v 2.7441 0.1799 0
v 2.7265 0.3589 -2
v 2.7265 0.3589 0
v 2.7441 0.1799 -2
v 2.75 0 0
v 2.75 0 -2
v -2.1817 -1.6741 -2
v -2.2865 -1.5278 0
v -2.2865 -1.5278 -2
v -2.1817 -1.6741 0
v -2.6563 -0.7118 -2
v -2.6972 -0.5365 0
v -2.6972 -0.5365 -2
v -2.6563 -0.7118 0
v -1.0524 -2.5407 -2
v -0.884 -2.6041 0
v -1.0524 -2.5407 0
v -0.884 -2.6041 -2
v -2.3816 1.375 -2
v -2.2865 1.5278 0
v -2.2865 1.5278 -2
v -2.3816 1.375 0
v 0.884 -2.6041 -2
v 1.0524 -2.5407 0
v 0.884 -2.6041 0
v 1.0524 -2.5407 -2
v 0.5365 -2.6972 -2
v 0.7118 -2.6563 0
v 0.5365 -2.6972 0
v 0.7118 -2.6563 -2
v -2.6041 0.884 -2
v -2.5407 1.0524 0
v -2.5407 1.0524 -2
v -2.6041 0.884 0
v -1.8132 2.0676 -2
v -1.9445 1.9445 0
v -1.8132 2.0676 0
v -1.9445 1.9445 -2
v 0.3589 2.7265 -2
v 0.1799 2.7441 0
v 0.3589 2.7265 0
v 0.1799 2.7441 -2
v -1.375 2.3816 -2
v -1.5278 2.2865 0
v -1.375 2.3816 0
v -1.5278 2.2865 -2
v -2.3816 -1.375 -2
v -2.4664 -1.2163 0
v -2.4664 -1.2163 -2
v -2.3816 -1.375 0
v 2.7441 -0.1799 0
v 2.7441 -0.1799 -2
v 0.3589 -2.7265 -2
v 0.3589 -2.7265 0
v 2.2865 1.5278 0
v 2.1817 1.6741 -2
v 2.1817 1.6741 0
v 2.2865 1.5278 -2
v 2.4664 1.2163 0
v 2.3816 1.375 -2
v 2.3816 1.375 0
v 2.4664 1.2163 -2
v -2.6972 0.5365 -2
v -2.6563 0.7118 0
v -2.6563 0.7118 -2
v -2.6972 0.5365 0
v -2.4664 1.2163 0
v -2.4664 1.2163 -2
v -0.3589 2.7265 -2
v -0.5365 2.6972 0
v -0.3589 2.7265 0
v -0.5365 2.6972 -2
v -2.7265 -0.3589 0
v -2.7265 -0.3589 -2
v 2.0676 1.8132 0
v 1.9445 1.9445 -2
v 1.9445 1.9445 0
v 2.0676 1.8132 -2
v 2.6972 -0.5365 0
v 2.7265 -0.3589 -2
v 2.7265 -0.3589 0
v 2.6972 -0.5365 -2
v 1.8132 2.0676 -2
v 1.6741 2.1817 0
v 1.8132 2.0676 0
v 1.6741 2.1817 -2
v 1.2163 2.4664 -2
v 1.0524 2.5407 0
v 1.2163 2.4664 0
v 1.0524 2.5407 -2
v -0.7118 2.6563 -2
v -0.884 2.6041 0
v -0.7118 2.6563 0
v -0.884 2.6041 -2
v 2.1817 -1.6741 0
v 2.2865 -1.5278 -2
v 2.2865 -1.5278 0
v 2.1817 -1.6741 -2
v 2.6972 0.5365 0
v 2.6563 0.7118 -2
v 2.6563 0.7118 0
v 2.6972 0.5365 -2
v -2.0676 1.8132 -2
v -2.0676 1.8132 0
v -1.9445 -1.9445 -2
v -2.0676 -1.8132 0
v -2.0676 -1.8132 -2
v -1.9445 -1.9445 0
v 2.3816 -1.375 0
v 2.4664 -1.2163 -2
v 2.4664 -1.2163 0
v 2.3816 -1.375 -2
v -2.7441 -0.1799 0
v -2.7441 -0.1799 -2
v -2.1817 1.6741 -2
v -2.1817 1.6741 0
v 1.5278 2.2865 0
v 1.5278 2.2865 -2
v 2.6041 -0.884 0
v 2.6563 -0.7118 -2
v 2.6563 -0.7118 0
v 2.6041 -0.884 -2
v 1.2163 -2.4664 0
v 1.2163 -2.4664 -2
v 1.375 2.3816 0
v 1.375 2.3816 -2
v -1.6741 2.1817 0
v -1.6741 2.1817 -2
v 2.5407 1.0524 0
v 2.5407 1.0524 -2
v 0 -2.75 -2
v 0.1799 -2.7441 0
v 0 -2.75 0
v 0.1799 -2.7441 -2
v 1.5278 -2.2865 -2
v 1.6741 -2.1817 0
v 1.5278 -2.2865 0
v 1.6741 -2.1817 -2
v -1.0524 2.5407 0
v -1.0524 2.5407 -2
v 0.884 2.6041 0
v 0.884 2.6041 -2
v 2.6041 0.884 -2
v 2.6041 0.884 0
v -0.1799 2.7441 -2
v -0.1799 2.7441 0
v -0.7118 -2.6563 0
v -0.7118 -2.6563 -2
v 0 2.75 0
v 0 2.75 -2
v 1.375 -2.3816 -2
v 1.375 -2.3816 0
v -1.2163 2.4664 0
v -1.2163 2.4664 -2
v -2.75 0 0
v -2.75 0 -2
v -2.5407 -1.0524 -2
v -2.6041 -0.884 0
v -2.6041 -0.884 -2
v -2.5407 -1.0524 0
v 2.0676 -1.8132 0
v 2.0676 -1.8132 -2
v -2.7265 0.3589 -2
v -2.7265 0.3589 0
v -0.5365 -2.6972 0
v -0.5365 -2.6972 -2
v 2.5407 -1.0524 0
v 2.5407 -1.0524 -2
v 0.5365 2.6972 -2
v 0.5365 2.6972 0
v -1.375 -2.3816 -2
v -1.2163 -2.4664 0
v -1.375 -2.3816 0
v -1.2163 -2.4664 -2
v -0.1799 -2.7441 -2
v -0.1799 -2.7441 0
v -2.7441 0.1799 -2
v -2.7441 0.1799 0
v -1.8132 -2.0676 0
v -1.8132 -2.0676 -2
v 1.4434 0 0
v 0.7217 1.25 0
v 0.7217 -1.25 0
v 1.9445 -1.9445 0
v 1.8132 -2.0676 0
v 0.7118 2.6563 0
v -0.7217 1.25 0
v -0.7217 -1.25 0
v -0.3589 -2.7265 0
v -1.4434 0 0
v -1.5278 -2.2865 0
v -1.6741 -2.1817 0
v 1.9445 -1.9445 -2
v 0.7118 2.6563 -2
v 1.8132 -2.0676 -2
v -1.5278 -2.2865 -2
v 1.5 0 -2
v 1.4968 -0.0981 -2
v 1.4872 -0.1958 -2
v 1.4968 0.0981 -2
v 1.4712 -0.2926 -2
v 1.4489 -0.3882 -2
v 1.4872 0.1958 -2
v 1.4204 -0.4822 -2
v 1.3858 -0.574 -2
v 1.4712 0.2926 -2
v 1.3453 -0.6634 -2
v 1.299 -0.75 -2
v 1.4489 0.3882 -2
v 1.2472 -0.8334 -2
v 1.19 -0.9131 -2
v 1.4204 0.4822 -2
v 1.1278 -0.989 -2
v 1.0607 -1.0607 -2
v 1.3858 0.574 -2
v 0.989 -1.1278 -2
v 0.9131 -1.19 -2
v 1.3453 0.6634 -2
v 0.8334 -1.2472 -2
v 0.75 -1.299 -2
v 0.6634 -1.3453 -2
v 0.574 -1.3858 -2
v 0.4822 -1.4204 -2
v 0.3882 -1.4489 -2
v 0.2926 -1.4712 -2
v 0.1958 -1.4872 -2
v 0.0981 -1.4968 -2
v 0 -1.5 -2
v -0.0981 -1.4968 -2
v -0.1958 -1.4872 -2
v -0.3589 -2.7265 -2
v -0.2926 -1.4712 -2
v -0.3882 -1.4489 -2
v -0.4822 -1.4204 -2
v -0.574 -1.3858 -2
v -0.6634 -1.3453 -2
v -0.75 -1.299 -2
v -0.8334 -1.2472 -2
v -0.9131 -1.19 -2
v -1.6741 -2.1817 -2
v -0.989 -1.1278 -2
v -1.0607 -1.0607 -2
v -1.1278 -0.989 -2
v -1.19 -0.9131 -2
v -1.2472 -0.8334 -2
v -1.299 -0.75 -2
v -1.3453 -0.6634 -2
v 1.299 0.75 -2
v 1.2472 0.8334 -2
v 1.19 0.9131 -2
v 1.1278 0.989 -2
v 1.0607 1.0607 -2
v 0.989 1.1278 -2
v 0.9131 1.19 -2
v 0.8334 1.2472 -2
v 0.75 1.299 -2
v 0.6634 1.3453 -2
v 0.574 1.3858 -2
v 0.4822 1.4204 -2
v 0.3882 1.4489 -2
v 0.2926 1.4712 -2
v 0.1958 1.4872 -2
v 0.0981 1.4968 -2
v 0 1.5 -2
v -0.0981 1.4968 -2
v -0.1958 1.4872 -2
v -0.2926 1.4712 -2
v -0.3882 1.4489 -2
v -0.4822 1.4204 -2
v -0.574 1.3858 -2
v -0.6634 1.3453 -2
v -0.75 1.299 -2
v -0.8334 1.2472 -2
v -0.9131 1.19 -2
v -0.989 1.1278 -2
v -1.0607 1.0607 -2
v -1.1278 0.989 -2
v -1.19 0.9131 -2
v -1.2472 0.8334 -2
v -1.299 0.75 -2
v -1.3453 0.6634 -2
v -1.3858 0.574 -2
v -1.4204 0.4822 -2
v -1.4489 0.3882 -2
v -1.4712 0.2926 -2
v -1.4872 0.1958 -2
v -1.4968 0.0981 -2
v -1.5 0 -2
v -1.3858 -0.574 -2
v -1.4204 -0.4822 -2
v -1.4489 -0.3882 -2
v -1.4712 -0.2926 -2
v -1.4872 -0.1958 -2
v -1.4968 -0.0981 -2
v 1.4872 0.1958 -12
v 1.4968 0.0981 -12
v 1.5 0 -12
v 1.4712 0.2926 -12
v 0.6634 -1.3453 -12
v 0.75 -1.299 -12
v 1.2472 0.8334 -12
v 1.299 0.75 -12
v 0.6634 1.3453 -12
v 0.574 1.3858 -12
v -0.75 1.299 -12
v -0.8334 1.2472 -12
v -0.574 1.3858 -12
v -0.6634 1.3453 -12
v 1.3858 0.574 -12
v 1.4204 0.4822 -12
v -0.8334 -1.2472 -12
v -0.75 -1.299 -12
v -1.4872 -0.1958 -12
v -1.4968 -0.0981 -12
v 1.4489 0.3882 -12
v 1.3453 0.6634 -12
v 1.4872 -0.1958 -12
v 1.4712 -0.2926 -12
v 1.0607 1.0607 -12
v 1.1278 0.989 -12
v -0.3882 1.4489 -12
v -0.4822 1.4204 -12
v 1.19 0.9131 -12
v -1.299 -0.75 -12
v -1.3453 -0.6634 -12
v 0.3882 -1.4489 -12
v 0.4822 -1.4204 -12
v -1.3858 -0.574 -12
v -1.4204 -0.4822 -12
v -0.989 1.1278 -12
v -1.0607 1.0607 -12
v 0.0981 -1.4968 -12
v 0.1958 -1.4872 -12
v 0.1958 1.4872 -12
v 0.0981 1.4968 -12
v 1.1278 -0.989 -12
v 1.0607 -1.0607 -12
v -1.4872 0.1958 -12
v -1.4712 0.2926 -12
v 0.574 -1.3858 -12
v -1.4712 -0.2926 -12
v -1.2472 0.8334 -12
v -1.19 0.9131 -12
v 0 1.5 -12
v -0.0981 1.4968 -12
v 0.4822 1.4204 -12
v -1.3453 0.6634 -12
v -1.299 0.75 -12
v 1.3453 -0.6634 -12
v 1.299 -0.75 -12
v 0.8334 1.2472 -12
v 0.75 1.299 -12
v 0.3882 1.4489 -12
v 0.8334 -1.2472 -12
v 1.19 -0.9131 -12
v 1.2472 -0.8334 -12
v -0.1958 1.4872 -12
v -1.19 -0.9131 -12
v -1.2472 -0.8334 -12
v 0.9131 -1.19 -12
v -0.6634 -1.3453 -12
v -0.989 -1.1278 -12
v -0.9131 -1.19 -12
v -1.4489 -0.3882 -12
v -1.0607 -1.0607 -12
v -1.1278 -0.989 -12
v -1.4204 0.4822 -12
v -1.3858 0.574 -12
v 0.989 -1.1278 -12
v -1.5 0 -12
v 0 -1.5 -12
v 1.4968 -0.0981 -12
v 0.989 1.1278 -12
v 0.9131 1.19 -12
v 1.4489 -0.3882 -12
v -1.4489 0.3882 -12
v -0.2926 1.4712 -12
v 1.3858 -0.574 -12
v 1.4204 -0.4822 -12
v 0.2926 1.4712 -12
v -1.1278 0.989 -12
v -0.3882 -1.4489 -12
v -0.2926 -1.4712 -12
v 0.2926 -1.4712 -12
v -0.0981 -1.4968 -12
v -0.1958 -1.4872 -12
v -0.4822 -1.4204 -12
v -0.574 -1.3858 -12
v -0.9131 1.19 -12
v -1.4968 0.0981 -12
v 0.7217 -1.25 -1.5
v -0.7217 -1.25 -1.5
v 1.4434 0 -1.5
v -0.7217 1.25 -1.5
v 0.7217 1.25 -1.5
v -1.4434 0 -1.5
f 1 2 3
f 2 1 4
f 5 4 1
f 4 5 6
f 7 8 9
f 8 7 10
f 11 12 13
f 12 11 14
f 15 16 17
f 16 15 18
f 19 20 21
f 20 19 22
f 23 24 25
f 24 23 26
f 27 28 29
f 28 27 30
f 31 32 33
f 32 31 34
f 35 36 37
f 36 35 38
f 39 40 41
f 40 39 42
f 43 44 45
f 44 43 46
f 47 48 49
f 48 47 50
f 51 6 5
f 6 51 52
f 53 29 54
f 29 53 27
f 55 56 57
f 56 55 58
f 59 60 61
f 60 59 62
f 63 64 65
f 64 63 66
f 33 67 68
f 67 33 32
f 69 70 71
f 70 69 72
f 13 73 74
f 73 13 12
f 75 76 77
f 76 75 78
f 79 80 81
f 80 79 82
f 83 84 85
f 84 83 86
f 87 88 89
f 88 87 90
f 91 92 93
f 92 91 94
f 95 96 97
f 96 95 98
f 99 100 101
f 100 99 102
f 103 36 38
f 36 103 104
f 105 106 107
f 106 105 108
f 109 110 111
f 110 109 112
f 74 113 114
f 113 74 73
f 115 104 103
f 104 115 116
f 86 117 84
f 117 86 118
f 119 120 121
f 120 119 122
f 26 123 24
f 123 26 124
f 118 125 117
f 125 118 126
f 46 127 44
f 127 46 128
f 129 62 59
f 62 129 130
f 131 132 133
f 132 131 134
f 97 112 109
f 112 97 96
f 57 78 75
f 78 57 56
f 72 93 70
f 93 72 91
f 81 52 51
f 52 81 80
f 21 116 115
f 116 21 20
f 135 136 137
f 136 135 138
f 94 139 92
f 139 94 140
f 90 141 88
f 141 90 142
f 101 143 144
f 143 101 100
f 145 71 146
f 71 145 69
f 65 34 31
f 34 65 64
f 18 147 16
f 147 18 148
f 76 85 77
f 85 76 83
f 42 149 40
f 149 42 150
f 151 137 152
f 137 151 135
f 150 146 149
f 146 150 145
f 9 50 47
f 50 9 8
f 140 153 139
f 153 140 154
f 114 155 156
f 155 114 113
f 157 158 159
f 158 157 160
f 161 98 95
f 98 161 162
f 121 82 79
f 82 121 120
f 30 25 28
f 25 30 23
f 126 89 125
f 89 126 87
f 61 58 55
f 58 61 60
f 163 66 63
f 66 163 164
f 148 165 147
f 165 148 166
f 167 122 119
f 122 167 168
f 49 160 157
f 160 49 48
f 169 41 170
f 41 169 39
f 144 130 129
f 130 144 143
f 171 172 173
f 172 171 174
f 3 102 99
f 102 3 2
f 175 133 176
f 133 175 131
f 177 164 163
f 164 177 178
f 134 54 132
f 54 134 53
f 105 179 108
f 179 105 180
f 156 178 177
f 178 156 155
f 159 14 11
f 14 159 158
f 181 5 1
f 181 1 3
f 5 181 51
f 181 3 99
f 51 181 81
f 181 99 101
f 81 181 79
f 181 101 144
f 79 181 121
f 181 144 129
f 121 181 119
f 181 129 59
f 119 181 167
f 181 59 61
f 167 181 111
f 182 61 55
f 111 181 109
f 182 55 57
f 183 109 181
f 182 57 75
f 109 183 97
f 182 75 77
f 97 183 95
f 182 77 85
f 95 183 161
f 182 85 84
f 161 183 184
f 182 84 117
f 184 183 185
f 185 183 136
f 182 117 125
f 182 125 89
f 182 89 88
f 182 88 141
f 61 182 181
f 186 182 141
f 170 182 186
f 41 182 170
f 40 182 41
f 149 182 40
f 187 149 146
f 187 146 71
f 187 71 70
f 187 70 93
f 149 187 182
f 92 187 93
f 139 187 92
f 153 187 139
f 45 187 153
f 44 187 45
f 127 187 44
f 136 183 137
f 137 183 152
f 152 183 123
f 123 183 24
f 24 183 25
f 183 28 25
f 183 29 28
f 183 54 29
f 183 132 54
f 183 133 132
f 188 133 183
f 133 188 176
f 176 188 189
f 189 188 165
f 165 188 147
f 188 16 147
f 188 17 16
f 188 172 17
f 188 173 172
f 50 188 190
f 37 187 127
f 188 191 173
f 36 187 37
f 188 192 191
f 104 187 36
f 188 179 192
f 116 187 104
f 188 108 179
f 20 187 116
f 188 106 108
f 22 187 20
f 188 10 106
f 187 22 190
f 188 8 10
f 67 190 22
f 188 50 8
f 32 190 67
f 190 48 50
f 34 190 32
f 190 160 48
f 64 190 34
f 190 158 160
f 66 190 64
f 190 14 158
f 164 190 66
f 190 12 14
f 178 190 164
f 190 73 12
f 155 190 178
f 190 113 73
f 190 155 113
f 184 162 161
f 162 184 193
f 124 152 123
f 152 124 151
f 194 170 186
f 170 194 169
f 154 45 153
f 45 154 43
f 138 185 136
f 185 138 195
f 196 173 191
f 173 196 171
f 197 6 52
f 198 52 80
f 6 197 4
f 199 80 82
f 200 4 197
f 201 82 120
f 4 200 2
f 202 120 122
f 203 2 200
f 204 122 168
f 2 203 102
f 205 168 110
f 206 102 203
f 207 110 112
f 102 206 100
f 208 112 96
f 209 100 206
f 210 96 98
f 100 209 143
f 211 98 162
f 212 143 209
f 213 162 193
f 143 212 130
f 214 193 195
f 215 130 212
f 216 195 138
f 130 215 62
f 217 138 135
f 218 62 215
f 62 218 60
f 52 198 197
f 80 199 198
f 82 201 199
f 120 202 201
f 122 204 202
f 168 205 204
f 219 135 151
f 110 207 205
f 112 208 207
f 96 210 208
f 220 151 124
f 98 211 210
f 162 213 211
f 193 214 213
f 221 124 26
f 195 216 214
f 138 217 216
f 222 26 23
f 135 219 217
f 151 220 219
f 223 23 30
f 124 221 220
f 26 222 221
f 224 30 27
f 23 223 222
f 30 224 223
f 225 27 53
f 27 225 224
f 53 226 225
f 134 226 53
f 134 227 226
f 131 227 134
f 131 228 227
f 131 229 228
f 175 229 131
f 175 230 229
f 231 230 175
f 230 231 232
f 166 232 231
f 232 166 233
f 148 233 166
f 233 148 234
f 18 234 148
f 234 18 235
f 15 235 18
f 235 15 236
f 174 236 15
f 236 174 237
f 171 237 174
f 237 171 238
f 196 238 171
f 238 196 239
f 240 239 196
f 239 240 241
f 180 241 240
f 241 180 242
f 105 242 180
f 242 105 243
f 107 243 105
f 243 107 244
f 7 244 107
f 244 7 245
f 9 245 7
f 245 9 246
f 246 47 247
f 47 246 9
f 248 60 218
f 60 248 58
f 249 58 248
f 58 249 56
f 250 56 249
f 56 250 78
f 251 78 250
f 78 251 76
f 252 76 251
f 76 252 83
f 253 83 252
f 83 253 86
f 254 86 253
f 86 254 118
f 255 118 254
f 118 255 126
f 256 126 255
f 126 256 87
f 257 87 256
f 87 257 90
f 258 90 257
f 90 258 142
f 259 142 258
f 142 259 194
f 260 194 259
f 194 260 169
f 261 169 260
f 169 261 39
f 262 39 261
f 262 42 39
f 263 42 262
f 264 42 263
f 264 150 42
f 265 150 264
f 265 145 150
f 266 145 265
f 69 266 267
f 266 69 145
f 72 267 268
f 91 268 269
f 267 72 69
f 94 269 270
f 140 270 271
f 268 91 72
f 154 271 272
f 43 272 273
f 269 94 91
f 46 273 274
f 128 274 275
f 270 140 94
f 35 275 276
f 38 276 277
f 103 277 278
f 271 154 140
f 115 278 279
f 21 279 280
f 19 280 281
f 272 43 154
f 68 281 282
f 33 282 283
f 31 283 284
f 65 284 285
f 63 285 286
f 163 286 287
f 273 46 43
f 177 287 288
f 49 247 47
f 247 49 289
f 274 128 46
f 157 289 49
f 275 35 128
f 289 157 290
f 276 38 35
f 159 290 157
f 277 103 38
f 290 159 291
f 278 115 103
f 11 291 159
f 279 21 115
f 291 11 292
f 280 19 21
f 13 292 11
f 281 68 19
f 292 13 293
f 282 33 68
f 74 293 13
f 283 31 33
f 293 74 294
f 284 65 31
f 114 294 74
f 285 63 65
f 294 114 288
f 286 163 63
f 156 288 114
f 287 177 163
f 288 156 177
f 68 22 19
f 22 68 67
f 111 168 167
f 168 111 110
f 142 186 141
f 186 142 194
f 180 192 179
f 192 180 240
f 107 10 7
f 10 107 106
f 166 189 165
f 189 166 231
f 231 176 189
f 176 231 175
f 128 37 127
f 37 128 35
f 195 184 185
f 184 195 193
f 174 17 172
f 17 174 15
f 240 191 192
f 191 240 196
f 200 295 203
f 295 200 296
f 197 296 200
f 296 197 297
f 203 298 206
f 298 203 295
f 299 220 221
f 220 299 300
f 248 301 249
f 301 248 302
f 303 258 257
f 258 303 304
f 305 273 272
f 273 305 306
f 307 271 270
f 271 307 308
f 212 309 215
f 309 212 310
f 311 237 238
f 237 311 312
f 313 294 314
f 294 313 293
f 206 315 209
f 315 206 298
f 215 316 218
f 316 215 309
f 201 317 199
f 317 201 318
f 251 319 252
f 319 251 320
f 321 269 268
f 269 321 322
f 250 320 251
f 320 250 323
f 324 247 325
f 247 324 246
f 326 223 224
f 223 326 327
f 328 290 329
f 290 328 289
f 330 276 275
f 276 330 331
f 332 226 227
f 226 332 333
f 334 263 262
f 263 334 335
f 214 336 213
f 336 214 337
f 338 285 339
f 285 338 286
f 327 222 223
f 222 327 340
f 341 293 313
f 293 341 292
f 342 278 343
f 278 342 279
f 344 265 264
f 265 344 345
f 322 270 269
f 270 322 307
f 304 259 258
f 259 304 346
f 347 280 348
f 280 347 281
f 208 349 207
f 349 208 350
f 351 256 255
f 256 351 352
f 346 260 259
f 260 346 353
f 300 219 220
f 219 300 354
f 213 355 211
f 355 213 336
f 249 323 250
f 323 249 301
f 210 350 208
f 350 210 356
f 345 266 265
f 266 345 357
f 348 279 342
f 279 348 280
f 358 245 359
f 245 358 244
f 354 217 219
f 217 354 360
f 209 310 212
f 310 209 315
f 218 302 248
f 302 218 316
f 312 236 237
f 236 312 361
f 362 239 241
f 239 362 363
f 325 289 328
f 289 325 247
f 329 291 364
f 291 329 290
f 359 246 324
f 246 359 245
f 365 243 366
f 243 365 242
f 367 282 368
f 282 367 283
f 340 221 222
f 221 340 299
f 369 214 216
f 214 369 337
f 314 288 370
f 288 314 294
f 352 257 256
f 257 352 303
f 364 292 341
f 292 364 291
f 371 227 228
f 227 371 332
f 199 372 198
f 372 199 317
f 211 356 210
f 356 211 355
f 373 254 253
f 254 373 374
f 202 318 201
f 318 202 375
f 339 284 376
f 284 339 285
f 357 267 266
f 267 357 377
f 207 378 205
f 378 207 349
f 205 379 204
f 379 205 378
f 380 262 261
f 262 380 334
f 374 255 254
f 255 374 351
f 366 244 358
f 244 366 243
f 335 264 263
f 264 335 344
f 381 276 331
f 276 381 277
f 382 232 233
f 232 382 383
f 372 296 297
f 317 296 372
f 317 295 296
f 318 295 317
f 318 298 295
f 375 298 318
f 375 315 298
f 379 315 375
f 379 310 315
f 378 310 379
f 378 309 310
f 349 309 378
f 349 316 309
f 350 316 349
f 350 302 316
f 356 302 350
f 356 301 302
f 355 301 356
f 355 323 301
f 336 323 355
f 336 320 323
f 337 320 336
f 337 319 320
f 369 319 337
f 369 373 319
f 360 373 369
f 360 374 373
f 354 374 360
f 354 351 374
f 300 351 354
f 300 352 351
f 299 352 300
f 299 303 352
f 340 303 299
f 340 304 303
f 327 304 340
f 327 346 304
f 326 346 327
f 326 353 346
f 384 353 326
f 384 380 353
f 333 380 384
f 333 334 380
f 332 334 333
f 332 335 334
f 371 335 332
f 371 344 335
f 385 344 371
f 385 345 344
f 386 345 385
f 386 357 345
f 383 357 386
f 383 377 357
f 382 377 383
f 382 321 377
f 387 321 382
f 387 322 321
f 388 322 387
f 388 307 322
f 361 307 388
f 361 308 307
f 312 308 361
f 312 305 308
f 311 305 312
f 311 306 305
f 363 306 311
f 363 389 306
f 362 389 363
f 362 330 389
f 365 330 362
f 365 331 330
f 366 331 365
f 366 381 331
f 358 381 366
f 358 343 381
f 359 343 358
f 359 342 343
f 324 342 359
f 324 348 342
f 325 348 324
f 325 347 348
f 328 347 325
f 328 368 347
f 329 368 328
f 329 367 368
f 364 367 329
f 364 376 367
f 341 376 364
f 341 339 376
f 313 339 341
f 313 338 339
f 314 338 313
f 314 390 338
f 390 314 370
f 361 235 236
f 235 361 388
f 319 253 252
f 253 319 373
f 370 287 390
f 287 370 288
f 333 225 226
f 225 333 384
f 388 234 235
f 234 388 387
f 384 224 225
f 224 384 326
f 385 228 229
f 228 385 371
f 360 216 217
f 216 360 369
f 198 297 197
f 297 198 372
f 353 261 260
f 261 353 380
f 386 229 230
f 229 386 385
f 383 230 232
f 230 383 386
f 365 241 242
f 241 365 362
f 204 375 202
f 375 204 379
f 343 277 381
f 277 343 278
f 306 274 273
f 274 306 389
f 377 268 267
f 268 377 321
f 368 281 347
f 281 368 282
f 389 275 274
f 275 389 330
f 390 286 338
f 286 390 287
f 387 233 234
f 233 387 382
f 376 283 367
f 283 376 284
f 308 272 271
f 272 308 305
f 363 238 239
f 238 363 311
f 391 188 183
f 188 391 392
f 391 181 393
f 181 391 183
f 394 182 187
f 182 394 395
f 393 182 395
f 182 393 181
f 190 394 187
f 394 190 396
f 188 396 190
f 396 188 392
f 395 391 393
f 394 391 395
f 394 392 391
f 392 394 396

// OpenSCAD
// Socket head cap screw (M3-ish) — single connected solid
// Requested: 3.0mm shank dia, 5.5mm head dia, 2.0mm head height, 10mm long

$fn = 96;

// Parameters
thread_diameter_mm   = 3.0;
length_mm            = 10.0;   // under-head length
head_diameter_mm     = 5.5;
head_height_mm       = 2.0;

// Hex socket (approx for M3 SHCS; adjustable)
hex_socket_af_mm     = 2.5;    // across flats
hex_socket_depth_mm  = 1.5;

// Small overlap to ensure watertight unions
overlap_mm = 0.05;

// Derived
shank_r = thread_diameter_mm/2;
head_r  = head_diameter_mm/2;

// Convert hex across-flats to circumscribed radius for a 6-sided polygon
hex_r = hex_socket_af_mm / (2*cos(30));

module socket_head_cap_screw() {
    // Z=0 at top of head; screw extends in -Z
    difference() {
        union() {
            // Head: from z=-head_height to z=0
            translate([0,0,-head_height_mm/2])
                cylinder(r=head_r, h=head_height_mm, center=true);

            // Shank: from z=-(head_height+length) to z=-head_height
            translate([0,0,-head_height_mm - length_mm/2 + overlap_mm/2])
                cylinder(r=shank_r, h=length_mm + overlap_mm, center=true);
        }

        // Hex socket recess in head (open at top), depth into head
        translate([0,0,-hex_socket_depth_mm/2 + overlap_mm/2])
            cylinder(r=hex_r, h=hex_socket_depth_mm + overlap_mm, center=true, $fn=6);
    }
}

socket_head_cap_screw();
